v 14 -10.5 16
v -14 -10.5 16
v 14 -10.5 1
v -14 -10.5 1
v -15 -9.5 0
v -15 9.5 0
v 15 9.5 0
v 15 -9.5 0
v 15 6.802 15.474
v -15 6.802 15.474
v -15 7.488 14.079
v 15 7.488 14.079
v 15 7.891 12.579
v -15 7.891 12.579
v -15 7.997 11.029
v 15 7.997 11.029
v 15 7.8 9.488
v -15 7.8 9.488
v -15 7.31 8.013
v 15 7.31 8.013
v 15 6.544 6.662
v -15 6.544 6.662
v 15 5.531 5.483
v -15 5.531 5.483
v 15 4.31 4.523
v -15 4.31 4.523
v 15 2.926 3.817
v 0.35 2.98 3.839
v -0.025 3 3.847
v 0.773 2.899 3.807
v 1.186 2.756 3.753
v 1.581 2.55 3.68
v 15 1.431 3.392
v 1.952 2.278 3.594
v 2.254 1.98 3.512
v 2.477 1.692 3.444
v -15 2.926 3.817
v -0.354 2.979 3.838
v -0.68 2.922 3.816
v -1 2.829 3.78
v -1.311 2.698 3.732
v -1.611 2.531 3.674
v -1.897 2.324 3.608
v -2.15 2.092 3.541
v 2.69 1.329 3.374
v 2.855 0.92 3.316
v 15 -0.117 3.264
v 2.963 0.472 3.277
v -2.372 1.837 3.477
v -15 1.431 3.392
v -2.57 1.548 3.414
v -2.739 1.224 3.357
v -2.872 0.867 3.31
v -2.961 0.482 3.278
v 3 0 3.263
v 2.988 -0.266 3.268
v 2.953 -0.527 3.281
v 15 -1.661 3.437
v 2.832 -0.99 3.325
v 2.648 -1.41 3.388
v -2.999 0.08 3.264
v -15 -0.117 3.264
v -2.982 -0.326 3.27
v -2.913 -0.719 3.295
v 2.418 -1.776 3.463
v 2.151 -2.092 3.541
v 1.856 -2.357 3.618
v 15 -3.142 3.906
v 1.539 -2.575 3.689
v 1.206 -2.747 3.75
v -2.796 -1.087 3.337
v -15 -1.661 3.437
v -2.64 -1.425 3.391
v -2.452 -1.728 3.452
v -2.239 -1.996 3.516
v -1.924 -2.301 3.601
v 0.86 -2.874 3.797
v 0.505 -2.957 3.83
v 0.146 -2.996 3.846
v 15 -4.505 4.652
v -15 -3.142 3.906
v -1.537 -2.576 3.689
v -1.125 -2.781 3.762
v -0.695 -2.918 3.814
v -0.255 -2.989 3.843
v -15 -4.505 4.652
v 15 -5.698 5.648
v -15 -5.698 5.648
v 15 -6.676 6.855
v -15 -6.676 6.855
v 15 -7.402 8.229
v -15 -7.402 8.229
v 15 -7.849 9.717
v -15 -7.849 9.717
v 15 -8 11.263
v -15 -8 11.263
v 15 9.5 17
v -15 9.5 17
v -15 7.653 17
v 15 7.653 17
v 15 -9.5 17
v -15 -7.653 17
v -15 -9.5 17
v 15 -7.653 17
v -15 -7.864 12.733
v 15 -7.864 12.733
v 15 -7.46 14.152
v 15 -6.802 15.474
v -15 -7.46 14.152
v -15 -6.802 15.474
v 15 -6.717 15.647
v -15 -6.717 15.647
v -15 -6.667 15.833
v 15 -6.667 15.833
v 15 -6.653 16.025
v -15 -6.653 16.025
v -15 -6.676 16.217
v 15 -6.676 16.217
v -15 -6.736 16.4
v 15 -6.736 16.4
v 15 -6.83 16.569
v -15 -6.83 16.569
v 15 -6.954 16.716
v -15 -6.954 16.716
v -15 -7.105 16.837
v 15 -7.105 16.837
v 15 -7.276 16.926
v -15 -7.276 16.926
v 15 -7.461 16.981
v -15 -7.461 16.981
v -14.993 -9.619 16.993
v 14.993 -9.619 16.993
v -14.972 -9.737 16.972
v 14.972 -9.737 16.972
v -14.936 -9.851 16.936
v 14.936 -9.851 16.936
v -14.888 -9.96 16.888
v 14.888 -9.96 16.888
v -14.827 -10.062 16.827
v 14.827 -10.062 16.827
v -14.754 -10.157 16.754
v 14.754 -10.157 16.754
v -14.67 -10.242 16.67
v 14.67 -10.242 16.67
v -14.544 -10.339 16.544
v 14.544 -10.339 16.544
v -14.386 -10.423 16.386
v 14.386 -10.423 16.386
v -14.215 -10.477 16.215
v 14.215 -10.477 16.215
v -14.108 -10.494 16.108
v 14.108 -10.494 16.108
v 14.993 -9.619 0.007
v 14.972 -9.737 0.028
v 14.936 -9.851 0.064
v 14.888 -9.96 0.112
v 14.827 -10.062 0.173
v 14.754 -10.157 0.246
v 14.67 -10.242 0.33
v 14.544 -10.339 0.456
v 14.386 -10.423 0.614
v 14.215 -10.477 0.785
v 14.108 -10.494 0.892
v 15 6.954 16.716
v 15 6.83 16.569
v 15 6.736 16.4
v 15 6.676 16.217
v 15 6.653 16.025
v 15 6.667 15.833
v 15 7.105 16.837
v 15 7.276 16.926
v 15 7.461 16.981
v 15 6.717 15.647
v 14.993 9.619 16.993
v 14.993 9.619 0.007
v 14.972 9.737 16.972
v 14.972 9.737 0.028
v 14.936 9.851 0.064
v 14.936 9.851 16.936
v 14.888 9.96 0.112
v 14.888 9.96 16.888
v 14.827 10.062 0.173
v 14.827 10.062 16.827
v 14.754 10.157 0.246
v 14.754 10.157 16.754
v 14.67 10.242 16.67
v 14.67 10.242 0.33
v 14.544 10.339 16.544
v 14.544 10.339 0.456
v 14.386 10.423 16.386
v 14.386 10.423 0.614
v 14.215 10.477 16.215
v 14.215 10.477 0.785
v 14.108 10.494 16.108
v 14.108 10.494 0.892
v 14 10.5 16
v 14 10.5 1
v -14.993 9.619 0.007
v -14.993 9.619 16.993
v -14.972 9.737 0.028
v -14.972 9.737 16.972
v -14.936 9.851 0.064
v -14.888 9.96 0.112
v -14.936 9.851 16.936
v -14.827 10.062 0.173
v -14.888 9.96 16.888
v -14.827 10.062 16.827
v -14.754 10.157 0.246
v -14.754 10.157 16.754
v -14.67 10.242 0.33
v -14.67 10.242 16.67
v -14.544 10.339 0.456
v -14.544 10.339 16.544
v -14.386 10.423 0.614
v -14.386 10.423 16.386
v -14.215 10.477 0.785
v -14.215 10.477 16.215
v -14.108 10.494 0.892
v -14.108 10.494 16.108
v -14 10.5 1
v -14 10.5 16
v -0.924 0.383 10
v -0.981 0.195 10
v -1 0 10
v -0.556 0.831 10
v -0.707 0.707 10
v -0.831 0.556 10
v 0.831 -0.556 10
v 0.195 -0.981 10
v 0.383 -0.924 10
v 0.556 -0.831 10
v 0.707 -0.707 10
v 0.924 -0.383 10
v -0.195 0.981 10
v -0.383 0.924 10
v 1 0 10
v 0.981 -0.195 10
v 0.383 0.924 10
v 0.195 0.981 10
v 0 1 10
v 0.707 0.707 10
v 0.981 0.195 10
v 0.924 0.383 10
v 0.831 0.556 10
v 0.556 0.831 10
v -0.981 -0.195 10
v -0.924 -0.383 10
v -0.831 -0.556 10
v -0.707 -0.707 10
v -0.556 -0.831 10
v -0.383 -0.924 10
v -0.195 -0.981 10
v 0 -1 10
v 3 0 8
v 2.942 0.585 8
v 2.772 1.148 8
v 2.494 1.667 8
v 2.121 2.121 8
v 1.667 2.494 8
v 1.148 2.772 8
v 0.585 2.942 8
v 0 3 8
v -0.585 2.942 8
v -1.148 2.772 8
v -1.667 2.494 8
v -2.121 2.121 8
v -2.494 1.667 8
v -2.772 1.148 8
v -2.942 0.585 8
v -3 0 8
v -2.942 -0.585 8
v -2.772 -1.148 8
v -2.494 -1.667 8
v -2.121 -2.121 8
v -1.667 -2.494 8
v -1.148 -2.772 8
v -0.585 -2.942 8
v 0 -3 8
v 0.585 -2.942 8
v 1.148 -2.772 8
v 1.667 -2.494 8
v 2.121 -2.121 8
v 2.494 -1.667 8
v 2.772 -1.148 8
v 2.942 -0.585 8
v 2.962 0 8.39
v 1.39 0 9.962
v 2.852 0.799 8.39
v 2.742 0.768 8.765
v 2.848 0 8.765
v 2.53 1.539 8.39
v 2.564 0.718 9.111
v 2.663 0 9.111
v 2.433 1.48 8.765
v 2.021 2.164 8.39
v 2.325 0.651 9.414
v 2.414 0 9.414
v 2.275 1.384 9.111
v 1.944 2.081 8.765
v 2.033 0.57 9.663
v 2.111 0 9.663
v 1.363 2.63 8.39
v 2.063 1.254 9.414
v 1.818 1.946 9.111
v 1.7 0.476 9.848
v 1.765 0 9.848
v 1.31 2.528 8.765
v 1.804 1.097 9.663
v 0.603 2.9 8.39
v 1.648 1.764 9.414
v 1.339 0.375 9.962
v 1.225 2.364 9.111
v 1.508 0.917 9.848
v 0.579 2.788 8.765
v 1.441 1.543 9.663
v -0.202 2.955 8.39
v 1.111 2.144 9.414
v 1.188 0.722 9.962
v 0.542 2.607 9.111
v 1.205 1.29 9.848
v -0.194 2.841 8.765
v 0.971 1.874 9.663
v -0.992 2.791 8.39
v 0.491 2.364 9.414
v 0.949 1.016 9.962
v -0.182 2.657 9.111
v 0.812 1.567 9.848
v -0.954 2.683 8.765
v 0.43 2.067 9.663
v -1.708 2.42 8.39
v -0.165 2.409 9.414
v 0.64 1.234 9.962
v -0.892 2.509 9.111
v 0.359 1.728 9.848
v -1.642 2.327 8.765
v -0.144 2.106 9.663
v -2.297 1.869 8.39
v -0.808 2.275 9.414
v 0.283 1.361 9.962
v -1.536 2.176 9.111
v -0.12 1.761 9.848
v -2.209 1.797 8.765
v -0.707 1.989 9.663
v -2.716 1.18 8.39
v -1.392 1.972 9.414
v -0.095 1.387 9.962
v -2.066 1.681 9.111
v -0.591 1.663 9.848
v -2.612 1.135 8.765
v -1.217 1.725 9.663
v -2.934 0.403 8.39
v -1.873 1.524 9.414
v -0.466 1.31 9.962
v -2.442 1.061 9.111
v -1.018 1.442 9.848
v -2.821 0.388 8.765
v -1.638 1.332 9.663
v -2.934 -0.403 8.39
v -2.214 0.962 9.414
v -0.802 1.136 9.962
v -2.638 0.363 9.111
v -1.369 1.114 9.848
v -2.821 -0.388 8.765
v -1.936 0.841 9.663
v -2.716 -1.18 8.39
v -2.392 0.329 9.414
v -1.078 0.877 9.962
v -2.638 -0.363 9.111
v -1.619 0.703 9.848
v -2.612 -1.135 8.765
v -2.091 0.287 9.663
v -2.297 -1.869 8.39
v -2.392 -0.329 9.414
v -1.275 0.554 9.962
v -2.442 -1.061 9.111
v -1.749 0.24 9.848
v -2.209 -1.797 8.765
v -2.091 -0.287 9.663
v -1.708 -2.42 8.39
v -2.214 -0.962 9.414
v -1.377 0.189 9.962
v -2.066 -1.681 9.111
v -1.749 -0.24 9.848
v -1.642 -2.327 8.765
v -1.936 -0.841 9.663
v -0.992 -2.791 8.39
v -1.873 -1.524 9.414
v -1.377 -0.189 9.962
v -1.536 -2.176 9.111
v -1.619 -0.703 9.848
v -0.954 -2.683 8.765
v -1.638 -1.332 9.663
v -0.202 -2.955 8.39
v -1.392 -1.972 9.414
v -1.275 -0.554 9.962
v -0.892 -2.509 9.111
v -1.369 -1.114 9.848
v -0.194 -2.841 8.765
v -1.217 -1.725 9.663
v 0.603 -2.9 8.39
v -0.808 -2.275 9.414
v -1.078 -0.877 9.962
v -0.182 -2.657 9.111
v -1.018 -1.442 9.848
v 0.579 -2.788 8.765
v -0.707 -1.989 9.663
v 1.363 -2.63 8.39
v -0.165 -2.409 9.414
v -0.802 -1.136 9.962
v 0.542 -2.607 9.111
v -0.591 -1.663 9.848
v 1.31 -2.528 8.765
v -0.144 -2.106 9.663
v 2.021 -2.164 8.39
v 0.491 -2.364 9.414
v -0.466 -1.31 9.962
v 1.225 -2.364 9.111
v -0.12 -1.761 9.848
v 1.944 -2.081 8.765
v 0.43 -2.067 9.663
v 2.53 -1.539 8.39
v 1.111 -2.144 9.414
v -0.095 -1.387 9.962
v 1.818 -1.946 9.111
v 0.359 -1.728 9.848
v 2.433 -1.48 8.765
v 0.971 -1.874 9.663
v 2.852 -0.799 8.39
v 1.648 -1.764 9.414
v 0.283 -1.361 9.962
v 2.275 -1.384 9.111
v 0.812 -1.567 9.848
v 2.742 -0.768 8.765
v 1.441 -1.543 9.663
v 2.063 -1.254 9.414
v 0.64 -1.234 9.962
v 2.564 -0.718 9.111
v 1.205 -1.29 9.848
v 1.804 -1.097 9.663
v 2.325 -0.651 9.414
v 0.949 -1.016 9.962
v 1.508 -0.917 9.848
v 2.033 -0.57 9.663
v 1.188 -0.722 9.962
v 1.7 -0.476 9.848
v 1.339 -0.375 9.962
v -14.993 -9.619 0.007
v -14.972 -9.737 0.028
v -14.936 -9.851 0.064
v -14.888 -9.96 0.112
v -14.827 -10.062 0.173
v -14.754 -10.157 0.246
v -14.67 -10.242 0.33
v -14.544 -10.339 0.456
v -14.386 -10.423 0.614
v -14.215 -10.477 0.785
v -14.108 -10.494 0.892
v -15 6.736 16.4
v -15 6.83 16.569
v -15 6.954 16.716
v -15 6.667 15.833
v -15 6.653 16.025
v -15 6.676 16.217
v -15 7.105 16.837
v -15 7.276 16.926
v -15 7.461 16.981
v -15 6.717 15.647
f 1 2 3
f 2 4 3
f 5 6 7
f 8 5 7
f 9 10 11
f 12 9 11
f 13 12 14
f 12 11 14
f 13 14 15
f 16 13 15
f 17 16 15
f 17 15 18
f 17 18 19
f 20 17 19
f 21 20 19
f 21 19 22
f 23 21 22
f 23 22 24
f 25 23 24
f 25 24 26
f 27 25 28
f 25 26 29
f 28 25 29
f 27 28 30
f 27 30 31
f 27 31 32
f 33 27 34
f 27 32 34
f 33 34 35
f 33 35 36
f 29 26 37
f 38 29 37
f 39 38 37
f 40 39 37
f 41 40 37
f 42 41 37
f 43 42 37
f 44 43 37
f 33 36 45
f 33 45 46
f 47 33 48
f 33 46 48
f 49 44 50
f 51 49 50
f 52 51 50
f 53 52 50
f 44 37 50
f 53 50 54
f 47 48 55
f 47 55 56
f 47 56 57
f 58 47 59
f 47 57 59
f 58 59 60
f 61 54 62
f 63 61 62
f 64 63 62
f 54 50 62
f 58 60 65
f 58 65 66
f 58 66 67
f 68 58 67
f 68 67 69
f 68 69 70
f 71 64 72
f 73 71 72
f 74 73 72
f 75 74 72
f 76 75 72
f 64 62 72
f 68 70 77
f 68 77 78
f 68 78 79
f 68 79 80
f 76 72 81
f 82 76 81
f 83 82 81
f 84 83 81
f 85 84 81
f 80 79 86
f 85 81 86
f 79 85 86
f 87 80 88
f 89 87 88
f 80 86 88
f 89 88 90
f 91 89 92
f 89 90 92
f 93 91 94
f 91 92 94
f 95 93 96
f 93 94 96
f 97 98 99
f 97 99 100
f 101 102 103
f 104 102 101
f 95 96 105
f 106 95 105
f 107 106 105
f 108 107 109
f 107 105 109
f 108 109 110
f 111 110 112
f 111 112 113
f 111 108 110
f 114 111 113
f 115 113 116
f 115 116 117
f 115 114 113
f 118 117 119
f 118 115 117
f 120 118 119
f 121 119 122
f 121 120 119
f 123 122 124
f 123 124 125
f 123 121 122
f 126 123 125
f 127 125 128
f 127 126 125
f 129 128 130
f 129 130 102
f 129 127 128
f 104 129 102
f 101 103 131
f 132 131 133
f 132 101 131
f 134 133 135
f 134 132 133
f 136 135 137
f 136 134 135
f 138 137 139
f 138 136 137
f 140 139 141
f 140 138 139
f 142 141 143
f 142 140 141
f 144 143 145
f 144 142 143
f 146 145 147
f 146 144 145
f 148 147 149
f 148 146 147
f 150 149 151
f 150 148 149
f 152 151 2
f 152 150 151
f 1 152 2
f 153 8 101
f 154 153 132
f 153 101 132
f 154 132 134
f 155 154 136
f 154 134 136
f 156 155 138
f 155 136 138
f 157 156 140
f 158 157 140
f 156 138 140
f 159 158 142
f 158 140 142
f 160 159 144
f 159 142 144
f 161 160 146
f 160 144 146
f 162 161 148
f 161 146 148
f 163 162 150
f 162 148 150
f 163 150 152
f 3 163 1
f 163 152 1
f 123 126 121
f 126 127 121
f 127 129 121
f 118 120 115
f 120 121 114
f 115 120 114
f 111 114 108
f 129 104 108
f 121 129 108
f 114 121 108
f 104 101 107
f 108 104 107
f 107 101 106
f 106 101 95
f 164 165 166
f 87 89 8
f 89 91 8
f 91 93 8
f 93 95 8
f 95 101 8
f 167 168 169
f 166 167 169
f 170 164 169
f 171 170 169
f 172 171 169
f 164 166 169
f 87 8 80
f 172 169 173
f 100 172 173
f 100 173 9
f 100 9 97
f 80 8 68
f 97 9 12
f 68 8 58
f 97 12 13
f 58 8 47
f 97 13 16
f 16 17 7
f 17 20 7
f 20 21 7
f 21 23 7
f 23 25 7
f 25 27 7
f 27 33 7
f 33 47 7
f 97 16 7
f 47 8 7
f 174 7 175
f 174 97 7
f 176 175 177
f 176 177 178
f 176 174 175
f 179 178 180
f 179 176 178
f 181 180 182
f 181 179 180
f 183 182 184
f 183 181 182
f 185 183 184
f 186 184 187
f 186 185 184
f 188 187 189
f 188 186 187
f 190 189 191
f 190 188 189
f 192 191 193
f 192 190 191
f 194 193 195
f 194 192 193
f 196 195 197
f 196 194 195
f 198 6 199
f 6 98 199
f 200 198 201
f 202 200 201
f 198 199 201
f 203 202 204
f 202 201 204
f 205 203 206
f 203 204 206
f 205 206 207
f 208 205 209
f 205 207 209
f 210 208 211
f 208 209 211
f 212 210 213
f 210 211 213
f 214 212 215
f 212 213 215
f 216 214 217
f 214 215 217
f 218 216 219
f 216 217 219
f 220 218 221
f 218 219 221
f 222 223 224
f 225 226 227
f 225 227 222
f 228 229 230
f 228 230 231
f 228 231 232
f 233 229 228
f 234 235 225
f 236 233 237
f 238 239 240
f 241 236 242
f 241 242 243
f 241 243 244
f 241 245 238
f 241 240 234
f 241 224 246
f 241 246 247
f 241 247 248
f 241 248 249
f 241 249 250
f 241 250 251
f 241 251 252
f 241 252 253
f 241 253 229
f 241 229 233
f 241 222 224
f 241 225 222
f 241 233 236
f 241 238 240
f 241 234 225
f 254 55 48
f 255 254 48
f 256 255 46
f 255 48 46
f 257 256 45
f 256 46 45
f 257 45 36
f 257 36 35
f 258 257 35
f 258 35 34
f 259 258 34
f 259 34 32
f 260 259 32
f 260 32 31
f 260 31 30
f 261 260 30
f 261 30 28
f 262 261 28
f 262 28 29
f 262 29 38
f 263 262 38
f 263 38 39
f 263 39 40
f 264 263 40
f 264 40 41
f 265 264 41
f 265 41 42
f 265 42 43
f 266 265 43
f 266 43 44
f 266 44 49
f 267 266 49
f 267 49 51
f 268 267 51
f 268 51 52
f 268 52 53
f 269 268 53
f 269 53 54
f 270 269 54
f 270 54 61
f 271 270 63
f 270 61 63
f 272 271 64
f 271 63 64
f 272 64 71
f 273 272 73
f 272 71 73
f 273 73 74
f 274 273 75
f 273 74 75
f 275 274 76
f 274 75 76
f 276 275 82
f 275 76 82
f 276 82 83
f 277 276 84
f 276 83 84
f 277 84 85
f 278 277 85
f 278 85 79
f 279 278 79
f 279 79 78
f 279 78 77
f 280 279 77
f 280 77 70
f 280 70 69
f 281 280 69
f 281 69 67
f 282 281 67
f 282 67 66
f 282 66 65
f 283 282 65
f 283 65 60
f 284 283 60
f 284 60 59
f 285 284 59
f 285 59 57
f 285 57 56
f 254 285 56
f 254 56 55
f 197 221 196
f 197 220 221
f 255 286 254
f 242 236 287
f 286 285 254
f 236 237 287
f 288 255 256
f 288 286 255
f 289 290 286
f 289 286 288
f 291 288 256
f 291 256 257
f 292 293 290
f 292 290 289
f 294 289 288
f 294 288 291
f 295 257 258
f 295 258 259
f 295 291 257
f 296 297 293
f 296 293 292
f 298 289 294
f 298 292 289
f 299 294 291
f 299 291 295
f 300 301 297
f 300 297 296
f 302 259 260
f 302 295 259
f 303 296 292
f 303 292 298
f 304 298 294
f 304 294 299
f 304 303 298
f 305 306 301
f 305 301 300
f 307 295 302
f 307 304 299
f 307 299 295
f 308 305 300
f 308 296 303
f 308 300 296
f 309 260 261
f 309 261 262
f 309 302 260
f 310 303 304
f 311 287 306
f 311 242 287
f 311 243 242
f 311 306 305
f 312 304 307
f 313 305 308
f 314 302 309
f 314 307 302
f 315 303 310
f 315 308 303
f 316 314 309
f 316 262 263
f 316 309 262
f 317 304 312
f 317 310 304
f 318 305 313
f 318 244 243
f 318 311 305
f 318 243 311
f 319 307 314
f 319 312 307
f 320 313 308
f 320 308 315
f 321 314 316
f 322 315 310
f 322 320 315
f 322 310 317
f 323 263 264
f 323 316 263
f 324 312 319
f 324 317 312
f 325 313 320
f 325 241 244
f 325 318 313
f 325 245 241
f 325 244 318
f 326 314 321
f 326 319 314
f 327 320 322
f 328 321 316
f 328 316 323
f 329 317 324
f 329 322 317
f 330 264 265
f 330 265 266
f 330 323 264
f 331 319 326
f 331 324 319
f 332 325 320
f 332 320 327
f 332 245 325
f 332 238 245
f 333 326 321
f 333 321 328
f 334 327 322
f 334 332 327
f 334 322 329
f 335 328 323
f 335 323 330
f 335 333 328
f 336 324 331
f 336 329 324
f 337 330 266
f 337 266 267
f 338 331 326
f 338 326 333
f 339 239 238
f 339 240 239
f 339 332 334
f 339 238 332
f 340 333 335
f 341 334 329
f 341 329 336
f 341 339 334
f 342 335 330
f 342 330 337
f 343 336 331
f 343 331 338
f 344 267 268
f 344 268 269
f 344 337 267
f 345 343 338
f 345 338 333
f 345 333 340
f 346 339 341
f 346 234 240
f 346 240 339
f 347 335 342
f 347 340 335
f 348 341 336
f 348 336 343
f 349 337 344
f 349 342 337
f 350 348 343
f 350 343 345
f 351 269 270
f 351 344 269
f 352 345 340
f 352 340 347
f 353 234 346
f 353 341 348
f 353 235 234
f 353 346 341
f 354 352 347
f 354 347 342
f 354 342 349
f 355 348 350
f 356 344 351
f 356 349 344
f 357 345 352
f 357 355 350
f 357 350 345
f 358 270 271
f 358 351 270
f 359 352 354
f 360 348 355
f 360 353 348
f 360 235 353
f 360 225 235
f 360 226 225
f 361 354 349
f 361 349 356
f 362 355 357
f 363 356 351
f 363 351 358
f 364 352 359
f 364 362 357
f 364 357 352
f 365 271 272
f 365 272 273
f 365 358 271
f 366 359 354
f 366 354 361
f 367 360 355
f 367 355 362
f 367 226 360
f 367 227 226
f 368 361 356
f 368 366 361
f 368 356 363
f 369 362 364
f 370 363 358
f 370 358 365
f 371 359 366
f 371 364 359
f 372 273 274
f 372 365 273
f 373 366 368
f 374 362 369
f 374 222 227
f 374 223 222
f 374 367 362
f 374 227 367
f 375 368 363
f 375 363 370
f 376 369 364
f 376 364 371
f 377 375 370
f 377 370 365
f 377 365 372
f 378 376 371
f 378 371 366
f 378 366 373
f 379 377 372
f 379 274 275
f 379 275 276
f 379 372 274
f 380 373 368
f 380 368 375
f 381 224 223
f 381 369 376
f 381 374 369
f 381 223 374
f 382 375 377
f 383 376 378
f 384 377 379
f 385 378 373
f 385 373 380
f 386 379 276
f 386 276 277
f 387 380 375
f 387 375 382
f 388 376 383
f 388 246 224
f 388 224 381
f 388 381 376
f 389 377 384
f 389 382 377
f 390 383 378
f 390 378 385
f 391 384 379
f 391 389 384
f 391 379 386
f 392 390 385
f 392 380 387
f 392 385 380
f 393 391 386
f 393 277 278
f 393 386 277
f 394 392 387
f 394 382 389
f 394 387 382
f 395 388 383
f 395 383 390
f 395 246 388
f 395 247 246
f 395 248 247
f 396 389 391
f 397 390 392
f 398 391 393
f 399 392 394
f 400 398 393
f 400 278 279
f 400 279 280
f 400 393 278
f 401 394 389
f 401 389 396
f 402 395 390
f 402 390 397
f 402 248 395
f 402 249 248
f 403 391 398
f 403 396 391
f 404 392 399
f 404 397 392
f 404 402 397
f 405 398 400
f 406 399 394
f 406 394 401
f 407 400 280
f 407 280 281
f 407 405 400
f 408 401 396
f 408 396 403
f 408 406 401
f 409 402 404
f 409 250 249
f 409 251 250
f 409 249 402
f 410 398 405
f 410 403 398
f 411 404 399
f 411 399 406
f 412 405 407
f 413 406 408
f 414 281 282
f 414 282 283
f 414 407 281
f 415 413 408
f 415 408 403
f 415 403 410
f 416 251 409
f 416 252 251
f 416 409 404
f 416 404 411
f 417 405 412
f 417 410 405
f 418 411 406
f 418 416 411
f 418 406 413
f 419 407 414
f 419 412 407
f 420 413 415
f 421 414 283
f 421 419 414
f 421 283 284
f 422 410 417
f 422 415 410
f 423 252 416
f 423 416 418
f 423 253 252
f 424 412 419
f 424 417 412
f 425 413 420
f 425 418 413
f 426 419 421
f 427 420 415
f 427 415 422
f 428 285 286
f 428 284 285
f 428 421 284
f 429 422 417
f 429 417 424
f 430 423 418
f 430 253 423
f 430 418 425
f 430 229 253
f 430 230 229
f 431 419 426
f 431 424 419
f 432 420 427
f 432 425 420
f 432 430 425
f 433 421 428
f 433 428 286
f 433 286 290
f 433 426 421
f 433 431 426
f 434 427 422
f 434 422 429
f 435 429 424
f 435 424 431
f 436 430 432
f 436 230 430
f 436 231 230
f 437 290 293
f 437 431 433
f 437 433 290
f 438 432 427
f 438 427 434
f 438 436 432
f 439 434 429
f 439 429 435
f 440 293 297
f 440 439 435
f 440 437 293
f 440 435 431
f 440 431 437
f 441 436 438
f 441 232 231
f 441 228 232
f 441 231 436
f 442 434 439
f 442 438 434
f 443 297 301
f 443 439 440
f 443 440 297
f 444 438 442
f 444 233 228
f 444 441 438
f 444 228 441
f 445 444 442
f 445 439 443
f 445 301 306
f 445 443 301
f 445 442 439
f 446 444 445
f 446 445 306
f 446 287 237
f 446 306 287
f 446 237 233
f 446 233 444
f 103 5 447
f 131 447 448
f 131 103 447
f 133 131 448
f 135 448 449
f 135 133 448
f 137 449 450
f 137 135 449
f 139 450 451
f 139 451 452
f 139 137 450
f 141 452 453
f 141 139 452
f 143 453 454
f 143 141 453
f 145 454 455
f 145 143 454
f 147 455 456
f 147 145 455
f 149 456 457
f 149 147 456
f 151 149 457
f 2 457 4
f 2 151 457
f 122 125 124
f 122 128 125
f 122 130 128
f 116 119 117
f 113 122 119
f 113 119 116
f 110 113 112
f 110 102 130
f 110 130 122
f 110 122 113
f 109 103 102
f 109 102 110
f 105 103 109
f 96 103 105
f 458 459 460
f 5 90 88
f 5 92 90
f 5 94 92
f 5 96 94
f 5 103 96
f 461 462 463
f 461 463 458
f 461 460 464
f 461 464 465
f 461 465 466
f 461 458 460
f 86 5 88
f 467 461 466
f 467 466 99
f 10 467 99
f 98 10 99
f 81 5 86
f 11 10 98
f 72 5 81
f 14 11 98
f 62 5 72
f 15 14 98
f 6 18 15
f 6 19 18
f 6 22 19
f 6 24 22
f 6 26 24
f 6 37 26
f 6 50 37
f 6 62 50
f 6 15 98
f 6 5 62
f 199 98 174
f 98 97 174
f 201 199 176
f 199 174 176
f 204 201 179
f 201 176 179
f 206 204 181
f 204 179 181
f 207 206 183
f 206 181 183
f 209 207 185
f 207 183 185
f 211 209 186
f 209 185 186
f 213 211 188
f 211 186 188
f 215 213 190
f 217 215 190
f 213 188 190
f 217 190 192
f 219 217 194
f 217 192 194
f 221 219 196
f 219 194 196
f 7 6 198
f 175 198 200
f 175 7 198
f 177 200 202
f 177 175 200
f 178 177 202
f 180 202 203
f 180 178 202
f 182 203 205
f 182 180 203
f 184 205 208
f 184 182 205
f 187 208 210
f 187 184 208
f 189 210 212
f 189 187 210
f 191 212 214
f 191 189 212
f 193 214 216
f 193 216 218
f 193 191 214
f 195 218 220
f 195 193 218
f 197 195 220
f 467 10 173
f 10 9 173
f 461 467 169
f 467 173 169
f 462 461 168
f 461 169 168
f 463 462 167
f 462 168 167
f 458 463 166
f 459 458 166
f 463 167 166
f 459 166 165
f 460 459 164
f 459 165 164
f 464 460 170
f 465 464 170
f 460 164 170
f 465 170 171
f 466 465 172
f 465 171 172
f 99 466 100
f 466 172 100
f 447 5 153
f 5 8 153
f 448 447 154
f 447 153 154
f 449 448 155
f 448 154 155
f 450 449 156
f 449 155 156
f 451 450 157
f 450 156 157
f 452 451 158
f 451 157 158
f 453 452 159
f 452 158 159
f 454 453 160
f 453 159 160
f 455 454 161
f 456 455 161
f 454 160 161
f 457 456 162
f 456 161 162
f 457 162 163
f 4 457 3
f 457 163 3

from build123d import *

# Parameters (mm, degrees)
F0_W     = 30
F0_H     = 21
F0_R     = 3
F1_DEPTH = 17
F3_DEPTH = 35
F4_DEPTH = 10
F5_R     = 1
F6_R     = 2


with BuildPart() as f1:
    # F0 (on Top) → F1 (new body)
    with BuildSketch(Plane.XY):
        Rectangle(F0_W, F0_H)
        Circle(F0_R, mode=Mode.SUBTRACT)
    extrude(amount=F1_DEPTH)

    # F2 (on face) → F3 (cut)
    with BuildSketch(Plane(origin=(-15, 0, 0), x_dir=(0, -1, 0), z_dir=(-1, 0, 0))):
        with BuildLine():
            ThreePointArc((-5.5756953559, 17), (-3.1140357378, 3.8940927926), (8, 11.2631348893))
            ThreePointArc((8, 11.2631348893), (7.3690420967, 14.3771706271), (5.5756953559, 17))
            Line((5.5756953559, 17), (-5.5756953559, 17))
        make_face()
    extrude(amount=-F3_DEPTH, mode=Mode.SUBTRACT)

    # F0 (on Top) → F4 (join)
    with BuildSketch(Plane.XY):
        Circle(F0_R)
    extrude(amount=F4_DEPTH)

    # F5
    f5_edges = [f1.edges().sort_by_distance(p)[0] for p in [
        (0, -10.5, 17),
        (0, 10.5, 17),
        (0, 5.575695, 17),
        (0, -5.575695, 17),
        (0, -10.5, 0),
        (0, 10.5, 0),
        (-15, 10.5, 8.5),
        (15, 10.5, 8.5),
        (15, -10.5, 8.5),
        (-15, -10.5, 8.5),
    ]]
    fillet(f5_edges, radius=F5_R)

    # F6
    f6_edges = [f1.edges().sort_by_distance(p)[0] for p in [
        (-3, 0, 10),
    ]]
    fillet(f6_edges, radius=F6_R)


solid = f1.part
